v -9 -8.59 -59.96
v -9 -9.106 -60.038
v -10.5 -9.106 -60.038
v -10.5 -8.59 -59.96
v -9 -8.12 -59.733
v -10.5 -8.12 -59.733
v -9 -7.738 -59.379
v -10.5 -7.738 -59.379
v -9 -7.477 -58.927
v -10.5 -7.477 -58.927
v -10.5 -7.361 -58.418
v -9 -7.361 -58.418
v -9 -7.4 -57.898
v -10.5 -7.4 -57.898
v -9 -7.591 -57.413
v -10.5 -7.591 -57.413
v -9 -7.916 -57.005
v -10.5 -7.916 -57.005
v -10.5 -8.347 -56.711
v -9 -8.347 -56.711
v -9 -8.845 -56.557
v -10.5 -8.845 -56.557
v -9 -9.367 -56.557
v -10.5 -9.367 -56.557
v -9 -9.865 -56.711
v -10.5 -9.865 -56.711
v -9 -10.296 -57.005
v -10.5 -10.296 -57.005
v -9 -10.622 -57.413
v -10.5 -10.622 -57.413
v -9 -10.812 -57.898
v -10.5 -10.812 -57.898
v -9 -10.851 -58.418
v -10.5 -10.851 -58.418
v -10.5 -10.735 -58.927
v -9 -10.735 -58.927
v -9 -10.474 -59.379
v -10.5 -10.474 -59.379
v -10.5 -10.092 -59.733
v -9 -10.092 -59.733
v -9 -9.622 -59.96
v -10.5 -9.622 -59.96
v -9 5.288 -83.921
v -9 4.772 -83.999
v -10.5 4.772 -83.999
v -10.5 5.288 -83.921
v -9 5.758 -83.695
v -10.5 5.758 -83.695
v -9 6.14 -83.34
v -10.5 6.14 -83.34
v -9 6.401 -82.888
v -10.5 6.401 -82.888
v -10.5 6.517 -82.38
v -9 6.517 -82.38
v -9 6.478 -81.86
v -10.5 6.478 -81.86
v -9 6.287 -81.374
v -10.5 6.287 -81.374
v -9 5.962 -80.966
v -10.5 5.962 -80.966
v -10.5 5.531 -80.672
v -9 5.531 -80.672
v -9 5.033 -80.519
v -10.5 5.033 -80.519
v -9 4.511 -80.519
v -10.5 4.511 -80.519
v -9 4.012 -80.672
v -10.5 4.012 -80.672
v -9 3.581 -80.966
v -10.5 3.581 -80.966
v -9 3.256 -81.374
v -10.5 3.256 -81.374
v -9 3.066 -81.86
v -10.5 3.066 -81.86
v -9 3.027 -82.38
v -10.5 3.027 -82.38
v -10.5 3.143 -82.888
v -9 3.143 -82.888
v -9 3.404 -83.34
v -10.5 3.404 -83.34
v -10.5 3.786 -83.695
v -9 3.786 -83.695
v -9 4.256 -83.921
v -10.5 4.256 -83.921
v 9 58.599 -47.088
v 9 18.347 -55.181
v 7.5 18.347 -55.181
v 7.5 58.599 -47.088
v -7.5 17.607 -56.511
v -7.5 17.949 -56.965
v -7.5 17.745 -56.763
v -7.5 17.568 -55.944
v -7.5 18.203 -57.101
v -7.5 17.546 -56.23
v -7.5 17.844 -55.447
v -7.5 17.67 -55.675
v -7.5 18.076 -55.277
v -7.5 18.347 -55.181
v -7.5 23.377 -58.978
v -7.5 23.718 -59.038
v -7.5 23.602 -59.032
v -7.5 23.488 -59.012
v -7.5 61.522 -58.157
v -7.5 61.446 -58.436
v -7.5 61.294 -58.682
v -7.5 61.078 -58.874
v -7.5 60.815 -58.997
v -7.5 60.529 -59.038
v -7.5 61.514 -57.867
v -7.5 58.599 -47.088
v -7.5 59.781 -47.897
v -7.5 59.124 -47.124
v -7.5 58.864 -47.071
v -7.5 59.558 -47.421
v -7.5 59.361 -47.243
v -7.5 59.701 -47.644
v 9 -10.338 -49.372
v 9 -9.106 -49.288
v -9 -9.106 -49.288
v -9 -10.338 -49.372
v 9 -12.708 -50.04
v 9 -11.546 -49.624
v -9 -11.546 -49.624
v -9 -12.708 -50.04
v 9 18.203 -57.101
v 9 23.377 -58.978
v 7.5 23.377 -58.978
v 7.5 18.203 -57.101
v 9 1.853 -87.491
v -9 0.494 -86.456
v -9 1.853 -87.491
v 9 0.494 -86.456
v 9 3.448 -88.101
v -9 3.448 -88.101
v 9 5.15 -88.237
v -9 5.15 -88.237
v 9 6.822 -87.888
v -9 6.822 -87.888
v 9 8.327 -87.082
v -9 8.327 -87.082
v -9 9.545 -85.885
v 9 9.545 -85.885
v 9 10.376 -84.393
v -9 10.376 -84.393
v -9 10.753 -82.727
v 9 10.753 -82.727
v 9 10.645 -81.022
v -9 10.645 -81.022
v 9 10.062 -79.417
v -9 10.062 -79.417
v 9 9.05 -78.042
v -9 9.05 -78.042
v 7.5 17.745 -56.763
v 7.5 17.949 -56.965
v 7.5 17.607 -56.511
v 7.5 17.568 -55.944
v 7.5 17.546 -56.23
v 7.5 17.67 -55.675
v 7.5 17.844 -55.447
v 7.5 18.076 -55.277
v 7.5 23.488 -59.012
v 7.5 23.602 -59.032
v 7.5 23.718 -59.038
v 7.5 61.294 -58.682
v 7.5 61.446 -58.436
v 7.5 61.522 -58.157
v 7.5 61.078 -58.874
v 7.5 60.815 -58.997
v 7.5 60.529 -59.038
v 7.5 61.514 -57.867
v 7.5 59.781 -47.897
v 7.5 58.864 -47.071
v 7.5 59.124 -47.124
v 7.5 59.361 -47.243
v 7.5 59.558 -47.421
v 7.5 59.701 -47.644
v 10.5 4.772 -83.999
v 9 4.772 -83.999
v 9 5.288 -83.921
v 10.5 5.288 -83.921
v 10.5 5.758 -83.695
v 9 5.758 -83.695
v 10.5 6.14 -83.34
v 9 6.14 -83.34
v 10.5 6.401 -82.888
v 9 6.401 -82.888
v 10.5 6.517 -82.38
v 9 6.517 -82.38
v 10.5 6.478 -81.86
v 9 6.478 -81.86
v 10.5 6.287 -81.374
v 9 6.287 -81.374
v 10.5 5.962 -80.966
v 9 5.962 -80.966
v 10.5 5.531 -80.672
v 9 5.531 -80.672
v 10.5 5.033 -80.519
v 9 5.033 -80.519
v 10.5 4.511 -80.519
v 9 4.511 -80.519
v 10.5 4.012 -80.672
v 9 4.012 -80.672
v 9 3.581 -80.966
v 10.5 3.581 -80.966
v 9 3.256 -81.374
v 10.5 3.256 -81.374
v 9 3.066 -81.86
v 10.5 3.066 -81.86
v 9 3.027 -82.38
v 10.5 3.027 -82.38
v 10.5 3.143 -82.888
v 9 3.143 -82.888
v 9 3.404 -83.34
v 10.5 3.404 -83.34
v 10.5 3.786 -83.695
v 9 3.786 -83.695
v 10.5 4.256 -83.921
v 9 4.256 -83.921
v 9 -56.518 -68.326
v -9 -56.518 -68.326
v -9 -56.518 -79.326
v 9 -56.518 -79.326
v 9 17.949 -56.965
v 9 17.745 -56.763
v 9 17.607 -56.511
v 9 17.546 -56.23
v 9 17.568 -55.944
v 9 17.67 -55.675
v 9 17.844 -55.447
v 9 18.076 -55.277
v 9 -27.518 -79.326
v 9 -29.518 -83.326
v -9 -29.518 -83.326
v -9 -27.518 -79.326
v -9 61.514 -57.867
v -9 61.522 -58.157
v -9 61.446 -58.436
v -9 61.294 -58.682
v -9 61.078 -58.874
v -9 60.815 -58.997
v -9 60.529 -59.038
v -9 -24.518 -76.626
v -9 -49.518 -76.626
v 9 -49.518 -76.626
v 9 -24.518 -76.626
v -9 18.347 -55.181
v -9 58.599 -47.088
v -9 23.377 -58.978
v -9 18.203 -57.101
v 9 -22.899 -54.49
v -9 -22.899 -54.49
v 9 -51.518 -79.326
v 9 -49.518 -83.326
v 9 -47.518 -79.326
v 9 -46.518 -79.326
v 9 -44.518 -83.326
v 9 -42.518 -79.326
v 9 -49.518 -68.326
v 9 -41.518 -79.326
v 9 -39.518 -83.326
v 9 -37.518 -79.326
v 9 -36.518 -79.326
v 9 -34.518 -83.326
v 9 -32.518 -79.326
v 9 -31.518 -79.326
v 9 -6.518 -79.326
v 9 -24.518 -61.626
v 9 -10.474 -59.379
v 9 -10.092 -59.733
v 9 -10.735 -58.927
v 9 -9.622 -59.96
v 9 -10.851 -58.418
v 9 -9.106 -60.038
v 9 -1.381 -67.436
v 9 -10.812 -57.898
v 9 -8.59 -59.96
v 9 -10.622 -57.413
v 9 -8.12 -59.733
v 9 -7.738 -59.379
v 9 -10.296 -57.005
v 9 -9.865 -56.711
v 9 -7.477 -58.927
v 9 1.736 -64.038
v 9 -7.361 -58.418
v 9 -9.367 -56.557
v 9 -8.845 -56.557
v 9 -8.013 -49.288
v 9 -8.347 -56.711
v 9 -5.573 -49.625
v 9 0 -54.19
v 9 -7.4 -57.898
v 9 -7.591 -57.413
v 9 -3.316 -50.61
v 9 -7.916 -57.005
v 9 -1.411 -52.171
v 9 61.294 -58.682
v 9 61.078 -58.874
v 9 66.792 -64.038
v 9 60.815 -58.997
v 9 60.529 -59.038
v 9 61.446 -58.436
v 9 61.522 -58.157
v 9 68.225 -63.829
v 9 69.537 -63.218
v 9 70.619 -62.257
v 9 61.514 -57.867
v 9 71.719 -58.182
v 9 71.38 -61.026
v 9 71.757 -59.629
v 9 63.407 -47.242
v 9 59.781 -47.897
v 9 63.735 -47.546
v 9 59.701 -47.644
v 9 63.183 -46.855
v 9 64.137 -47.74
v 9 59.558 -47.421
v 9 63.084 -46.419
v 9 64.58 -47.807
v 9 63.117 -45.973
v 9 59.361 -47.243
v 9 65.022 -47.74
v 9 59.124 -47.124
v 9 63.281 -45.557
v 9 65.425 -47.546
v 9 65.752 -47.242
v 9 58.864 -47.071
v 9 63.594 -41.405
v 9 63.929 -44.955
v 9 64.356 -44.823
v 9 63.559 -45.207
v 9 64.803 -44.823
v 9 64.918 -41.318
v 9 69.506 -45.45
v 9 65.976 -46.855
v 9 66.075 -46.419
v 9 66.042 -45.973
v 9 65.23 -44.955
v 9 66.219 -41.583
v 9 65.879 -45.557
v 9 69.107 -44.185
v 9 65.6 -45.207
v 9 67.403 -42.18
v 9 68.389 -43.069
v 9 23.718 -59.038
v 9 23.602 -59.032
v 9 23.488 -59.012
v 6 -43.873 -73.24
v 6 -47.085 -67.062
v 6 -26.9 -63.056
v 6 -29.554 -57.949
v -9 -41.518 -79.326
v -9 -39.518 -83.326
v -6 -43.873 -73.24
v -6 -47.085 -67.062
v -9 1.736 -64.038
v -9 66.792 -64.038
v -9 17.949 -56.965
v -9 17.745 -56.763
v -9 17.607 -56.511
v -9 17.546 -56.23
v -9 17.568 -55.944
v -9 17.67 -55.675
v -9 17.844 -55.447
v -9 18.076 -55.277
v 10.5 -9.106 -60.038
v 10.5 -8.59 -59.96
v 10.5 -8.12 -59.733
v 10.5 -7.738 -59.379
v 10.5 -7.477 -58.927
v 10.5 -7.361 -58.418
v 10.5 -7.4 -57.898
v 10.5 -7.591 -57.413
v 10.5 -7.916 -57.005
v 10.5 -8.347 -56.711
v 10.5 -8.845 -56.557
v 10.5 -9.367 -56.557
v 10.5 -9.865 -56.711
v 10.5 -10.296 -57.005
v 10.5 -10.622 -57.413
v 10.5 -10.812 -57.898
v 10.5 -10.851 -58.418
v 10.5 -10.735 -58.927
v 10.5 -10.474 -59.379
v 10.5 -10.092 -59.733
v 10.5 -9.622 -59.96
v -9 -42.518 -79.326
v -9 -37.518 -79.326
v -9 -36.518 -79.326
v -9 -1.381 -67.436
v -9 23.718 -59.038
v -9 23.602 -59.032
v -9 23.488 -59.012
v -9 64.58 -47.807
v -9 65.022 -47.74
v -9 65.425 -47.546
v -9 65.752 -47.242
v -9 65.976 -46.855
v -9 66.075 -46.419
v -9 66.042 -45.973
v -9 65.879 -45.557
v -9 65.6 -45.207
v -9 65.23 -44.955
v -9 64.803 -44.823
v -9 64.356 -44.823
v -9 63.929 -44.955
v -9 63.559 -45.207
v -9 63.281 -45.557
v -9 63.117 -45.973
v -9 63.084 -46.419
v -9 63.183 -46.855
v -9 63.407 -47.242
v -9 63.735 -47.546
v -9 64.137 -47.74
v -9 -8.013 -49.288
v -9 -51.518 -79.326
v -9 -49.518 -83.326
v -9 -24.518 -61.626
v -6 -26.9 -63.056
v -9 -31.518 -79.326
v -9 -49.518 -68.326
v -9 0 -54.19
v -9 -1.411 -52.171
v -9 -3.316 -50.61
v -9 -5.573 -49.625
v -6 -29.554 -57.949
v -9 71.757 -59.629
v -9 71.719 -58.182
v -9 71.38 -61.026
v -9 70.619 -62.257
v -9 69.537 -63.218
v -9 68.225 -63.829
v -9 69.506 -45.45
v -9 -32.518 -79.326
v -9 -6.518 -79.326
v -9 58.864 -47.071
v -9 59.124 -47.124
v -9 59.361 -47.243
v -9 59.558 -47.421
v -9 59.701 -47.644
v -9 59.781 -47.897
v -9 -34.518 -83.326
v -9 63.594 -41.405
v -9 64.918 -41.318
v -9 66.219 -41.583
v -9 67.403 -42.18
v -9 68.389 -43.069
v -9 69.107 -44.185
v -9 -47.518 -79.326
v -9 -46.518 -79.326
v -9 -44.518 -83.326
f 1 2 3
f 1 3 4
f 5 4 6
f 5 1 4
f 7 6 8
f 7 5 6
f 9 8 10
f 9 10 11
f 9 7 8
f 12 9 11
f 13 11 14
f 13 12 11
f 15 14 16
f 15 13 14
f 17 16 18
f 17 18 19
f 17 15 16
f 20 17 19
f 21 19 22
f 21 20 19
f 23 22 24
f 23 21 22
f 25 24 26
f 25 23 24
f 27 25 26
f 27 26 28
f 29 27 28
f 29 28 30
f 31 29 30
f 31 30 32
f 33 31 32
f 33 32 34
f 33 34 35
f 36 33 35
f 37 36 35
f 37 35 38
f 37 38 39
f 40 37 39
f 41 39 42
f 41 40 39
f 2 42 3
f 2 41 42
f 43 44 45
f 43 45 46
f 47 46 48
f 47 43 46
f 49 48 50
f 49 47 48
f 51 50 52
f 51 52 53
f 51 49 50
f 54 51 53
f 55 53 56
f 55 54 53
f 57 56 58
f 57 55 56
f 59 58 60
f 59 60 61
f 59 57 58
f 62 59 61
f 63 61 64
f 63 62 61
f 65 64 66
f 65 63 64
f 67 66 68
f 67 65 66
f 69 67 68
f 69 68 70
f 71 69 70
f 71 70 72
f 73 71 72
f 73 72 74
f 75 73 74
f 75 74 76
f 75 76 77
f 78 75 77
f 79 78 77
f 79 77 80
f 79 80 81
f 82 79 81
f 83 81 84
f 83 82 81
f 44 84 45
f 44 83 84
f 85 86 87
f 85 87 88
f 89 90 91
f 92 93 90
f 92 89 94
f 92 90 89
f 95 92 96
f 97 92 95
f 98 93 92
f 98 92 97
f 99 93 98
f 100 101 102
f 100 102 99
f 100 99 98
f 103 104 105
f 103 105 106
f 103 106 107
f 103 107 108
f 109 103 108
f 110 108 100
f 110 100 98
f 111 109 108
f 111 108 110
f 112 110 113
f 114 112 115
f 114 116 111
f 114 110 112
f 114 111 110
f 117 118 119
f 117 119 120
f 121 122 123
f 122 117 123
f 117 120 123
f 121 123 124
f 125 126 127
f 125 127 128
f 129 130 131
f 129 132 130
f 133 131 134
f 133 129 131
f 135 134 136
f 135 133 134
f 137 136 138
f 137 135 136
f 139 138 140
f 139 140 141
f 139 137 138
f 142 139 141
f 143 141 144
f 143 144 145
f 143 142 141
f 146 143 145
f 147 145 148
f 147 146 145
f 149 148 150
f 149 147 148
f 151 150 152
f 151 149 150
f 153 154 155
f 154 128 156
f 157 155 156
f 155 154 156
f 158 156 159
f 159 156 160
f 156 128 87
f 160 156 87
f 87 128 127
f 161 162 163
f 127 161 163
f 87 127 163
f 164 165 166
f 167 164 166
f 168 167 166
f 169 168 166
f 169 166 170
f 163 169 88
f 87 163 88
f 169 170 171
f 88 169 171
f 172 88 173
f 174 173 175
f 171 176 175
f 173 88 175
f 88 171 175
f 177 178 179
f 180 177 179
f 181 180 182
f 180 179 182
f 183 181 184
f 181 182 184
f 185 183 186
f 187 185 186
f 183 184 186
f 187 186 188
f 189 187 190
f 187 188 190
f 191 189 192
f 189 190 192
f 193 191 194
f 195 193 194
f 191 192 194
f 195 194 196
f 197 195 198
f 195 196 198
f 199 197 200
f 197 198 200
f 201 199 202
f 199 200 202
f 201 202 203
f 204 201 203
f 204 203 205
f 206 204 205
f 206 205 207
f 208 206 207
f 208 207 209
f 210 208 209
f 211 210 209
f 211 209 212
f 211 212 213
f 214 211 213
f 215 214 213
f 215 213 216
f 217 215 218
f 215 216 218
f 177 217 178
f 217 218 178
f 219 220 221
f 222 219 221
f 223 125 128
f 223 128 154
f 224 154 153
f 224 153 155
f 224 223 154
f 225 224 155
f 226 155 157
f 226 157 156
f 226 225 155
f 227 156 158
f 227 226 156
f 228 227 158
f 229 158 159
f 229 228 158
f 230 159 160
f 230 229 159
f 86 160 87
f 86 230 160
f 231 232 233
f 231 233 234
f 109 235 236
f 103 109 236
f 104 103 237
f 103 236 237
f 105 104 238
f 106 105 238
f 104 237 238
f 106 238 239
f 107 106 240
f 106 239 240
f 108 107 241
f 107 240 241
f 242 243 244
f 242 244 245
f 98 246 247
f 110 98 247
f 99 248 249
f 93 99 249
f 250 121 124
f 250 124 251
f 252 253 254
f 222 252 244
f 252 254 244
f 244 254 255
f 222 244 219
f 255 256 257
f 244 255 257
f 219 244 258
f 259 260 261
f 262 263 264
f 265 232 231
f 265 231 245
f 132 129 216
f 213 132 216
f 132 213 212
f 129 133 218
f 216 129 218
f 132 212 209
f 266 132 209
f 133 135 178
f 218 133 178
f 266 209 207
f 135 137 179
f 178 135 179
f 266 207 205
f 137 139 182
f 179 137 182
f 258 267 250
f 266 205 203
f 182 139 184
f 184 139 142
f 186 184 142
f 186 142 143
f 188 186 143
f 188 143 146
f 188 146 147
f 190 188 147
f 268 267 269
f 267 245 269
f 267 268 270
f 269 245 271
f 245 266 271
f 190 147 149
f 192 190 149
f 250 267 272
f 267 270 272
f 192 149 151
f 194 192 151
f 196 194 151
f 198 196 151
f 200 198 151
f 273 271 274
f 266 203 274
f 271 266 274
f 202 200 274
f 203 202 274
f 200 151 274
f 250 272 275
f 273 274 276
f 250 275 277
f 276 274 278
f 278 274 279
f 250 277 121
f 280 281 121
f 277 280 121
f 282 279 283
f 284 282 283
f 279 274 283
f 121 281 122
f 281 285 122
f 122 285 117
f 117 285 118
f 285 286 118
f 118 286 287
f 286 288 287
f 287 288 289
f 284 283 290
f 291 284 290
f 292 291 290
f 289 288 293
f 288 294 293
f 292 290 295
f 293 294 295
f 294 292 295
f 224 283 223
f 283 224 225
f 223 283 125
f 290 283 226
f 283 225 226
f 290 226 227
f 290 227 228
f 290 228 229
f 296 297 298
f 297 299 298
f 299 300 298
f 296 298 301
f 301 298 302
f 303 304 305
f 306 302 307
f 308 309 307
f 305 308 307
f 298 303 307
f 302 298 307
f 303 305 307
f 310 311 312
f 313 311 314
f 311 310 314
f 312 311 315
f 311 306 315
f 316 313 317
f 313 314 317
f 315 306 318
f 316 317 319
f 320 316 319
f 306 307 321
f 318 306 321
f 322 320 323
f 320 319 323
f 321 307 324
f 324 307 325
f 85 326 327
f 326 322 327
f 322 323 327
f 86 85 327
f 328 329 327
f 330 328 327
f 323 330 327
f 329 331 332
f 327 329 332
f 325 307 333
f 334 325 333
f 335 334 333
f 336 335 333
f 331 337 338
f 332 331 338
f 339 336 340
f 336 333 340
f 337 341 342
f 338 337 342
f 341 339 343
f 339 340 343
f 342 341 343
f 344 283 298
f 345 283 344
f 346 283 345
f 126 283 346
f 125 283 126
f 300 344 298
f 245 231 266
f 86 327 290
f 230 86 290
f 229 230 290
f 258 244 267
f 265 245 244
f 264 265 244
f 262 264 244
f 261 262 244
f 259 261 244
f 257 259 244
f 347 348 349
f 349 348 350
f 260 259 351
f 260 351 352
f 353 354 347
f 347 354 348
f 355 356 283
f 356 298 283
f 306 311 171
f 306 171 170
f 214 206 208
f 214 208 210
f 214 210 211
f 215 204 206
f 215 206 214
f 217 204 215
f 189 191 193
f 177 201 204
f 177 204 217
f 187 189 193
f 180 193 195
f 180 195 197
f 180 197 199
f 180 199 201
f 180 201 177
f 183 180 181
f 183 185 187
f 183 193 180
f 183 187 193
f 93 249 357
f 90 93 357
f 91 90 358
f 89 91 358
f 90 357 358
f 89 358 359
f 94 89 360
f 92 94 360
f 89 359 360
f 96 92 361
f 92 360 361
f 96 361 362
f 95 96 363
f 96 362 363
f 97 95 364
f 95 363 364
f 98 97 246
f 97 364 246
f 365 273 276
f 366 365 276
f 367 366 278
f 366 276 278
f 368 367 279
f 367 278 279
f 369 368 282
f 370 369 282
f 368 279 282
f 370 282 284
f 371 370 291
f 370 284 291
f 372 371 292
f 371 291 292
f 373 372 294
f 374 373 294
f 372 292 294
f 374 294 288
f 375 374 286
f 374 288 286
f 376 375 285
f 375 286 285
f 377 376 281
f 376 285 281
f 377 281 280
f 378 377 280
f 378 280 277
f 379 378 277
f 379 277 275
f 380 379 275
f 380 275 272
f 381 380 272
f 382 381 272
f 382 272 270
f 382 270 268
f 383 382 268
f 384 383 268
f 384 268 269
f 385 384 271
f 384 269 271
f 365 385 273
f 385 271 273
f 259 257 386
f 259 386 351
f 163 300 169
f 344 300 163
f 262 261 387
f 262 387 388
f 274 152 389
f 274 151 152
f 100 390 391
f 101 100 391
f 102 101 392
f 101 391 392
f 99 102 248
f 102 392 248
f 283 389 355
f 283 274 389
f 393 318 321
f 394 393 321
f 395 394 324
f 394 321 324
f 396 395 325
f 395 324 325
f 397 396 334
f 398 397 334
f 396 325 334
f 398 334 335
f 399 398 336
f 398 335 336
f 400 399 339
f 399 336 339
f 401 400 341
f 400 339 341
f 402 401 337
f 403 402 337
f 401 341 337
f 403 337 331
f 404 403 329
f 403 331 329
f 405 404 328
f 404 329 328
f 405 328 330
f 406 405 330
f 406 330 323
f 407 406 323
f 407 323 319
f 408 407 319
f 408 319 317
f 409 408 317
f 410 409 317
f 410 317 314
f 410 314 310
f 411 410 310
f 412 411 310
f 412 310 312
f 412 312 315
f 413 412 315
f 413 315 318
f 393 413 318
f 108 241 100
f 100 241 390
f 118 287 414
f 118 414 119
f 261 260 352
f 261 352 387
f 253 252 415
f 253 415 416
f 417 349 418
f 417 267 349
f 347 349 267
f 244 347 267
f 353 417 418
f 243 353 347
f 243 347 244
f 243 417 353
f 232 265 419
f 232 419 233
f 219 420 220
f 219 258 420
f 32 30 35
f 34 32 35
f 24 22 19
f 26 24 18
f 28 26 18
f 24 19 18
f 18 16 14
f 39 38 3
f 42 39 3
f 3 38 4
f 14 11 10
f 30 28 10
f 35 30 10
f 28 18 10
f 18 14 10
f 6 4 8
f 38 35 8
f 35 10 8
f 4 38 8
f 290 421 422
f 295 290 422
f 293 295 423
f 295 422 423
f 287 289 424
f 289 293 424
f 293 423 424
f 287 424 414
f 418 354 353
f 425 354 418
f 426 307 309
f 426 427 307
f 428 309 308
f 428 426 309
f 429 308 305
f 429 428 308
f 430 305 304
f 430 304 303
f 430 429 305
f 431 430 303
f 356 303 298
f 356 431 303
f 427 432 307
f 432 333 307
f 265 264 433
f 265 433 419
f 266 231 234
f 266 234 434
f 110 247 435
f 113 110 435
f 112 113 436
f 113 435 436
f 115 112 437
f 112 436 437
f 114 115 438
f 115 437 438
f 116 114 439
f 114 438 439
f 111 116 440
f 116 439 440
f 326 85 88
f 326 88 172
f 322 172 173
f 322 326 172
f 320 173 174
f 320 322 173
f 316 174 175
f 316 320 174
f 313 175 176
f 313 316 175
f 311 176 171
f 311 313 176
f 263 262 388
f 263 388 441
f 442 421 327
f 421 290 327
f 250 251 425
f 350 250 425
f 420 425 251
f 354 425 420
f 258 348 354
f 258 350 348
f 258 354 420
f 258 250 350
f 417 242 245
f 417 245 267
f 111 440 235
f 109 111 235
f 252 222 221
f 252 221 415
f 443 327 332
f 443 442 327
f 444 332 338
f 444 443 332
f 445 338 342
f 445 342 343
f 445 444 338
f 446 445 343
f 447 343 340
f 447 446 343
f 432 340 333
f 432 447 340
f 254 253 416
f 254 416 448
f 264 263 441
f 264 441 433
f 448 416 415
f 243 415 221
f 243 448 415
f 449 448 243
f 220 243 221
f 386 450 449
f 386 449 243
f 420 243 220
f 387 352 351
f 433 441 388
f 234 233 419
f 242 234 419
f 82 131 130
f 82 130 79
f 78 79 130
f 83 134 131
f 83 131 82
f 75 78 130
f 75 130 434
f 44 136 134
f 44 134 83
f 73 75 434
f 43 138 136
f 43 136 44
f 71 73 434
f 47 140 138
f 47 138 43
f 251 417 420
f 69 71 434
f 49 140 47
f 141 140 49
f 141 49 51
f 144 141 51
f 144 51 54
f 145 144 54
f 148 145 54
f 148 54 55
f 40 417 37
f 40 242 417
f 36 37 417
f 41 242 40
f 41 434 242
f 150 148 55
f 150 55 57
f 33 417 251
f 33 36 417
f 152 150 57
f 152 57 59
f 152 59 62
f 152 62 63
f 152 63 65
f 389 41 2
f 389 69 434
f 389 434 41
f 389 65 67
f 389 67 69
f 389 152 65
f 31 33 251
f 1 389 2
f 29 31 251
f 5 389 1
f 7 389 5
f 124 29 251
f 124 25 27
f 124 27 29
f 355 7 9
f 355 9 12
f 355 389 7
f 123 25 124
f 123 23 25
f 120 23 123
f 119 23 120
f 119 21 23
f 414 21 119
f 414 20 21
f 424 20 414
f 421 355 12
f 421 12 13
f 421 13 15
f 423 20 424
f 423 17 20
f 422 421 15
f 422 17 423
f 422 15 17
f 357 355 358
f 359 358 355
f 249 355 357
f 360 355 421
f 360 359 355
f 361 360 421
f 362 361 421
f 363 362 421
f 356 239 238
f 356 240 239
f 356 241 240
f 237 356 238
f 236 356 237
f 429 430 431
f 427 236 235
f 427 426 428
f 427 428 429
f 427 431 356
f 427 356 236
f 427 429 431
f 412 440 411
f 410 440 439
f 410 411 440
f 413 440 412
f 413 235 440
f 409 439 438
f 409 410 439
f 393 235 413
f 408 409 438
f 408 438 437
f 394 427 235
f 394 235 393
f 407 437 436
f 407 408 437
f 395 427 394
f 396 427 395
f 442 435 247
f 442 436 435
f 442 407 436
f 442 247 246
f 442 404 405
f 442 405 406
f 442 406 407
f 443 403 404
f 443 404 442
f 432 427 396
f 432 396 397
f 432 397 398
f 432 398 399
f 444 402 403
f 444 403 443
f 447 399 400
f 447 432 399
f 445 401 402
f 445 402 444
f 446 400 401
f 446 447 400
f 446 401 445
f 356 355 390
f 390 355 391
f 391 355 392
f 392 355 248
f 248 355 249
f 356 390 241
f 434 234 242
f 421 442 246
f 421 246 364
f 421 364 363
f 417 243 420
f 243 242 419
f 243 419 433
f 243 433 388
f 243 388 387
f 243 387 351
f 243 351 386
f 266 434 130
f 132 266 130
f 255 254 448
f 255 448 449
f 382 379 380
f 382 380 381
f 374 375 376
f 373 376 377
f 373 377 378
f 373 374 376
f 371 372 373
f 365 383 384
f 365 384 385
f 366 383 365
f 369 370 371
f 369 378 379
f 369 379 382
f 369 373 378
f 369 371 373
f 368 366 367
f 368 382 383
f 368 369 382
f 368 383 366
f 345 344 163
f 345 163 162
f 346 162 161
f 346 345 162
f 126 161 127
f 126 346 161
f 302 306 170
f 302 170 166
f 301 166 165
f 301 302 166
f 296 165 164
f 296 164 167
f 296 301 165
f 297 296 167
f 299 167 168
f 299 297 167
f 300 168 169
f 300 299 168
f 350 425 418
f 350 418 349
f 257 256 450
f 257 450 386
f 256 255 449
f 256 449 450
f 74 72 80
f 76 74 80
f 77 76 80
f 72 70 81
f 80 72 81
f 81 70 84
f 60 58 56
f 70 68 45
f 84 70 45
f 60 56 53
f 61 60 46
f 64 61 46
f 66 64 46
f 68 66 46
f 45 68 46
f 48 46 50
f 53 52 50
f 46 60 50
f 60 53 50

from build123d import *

# Parameters (mm, degrees)
BOSS_EXTRUDE1_DEPTH     = 9
CUT_EXTRUDE1_DEPTH      = 116.769079262
CUT_EXTRUDE1_DEPTH_BACK = 116.769079262
BOSS_EXTRUDE2_DEPTH     = 18
LPATTERN1_COUNT         = 5
LPATTERN1_PITCH         = 5
FILLET1_R               = 9
FILLET2_R               = 5
SKETCH5_R               = 1.5
CUT_EXTRUDE2_DEPTH      = 25
CUT_EXTRUDE3_REACH      = 94.43
SKETCH8_W               = 12
SKETCH8_H               = 19.757506074
SKETCH9_R               = 1.75
BOSS_EXTRUDE3_DEPTH     = 1.5
SKETCH10_R              = 1.75
BOSS_EXTRUDE4_DEPTH     = 1.5
CUT_EXTRUDE5_DEPTH      = 1.5


with BuildPart() as part:
    # Sketch1 → Boss-Extrude1 (new, symmetric)
    with BuildSketch(Plane(origin=(0, 0, 0), x_dir=(0, 0, -1), z_dir=(1, 0, 0))):
        Polygon((64.03845405, 1.736481777), (54.19037652, 0), (40.392944784, 68.626750451), (64.03845405, 72.736481777), align=None)
        with BuildLine():
            Line((79.326468903, -6.518014035), (86.456160579, 0.493939802))
            ThreePointArc((86.456160579, 0.493939802), (86.526803283, 8.978927109), (78.041815975, 9.049569813))
            Line((78.041815975, 9.049569813), (67.436419126, -1.380692322))
            Line((67.436419126, -1.380692322), (64.03845405, 1.736481777))
            Line((64.03845405, 1.736481777), (54.19037652, 0))
            Line((54.19037652, 0), (49.287534486, -0.985718074))
            Line((49.287534486, -0.985718074), (49.287534486, -10.985718074))
            Line((49.287534486, -10.985718074), (54.49039716, -22.899165098))
            Line((54.49039716, -22.899165098), (68.326468903, -49.518014035))
            Line((68.326468903, -49.518014035), (68.326468903, -56.518014035))
            Line((68.326468903, -56.518014035), (79.326468903, -56.518014035))
            Line((79.326468903, -56.518014035), (79.326468903, -6.518014035))
        make_face()
    extrude(amount=BOSS_EXTRUDE1_DEPTH, both=True)

    # Sketch3 → Cut-Extrude1 (cut, two sides: drawn at the far end of the back side and taken through both)
    with BuildSketch(Plane(origin=(9, 0, 0), x_dir=(0, 0, -1), z_dir=(1, 0, 0)).offset(-CUT_EXTRUDE1_DEPTH_BACK)):
        Polygon((76.626468903, -49.518014035), (76.626468903, -24.518014035), (61.626468903, -24.518014035), align=None)
    extrude(amount=CUT_EXTRUDE1_DEPTH + CUT_EXTRUDE1_DEPTH_BACK, mode=Mode.SUBTRACT)

    # Sketch4 → Boss-Extrude2 (add)
    with BuildSketch(Plane(origin=(9, 0, 0), x_dir=(0, 0, -1), z_dir=(1, 0, 0))):
        Polygon((83.326468903, -49.518014035), (79.326468903, -49.518014035), (79.326468903, -51.518014035), align=None)
        Polygon((79.326468903, -47.518014035), (79.326468903, -49.518014035), (83.326468903, -49.518014035), align=None)
    boss_extrude2 = extrude(amount=-BOSS_EXTRUDE2_DEPTH)

    # LPattern1: Boss-Extrude2 ×5
    with Locations(*[(0, i * LPATTERN1_PITCH, 0) for i in range(1, LPATTERN1_COUNT)]):
        add(boss_extrude2)

    # Fillet1
    # the kernel refuses this fillet: 9 mm, written as the material it takes off along each edge
    with BuildSketch(Plane(origin=(-13.698844365, -10.985718074, -49.287534486), x_dir=(0, -0.9164190018423571, -0.4002202057146263), z_dir=(1, 0, 0))) as fillet1_piece_1:
        with BuildLine():
            CenterArc((FILLET1_R * 0.208837527352, FILLET1_R), FILLET1_R, 246.408054679, 23.591945321)
            Line((-FILLET1_R * 0.191382678363, FILLET1_R * 0.0835809981576), (-FILLET1_R * 0.199387082477, FILLET1_R * 0.0652526181208))
            Line((-FILLET1_R * 0.199387082477, FILLET1_R * 0.0652526181208), (-FILLET1_R * 0.00417675054703, -FILLET1_R * 0.02))
            Line((-FILLET1_R * 0.00417675054703, -FILLET1_R * 0.02), (FILLET1_R * 0.208837527352, -FILLET1_R * 0.02))
            Line((FILLET1_R * 0.208837527352, -FILLET1_R * 0.02), (FILLET1_R * 0.208837527352, 0))
        make_face()
    extrude(amount=27.397688731, mode=Mode.SUBTRACT)
    with BuildSketch(Plane(origin=(-26.569004687, -0.985718074, -49.287534486), x_dir=(0, -1, 0), z_dir=(1, 0, 0))) as fillet1_piece_2:
        with BuildLine():
            CenterArc((7.027601875, 9), FILLET1_R, 207.080362773, 62.919637227)
            Line((-0.985718074, 4.902842034), (-1.145984473, 4.820898874))
            ThreePointArc((-1.145984473, 4.820898874), (-0.669327824, 2.415941907), (-0.176468787, -0.03547911))
            Line((-0.176468787, -0.03547911), (0, -0.18))
            Line((0, -0.18), (7.027601875, -0.18))
            Line((7.027601875, -0.18), (7.027601875, 0))
        make_face()
    extrude(amount=53.138009374, mode=Mode.SUBTRACT)

    # Fillet2
    fillet2_edges = [part.edges().sort_by_distance(p)[0] for p in [
        (0, 68.626750451, -40.392944784),
        (0, 72.736481777, -64.03845405),
    ]]
    fillet(fillet2_edges, radius=FILLET2_R)

    # Sketch5 → Cut-Extrude2 (cut)
    with BuildSketch(Plane(origin=(9, 0, 0), x_dir=(0, 0, -1), z_dir=(1, 0, 0))):
        with Locations((46.306671362, 64.579632178)):
            Circle(SKETCH5_R)
    extrude(amount=-CUT_EXTRUDE2_DEPTH, mode=Mode.SUBTRACT)

    # Cut-Extrude3: up to this plane
    cut_extrude3_end = Plane(origin=(-9, -24.518014035, -61.626468903), z_dir=(0, -0.5144957554275262, 0.8574929257125444))
    # Sketch8 → Cut-Extrude3 (cut, up to the surface)
    with BuildSketch(Plane(origin=(0, 17.427872297, -33.529018106), x_dir=(1, 0, 0), z_dir=(0, -0.4612023914177088, 0.8872949645696107)), mode=Mode.PRIVATE) as cut_extrude3_sk1:
        with Locations((0, -62.828168401)):
            Rectangle(SKETCH8_W, SKETCH8_H)
    cut_extrude3_tool1 = split(extrude(cut_extrude3_sk1.sketch, amount=-CUT_EXTRUDE3_REACH, mode=Mode.PRIVATE), bisect_by=cut_extrude3_end, keep=Keep.BOTH, mode=Mode.PRIVATE)
    add(cut_extrude3_tool1.solids().sort_by_distance((0, -38.319245, -62.50552))[0], mode=Mode.SUBTRACT)

    # Sketch9 → Boss-Extrude3 (add)
    with BuildSketch(Plane(origin=(9, 0, 0), x_dir=(0, 0, -1), z_dir=(1, 0, 0))):
        with Locations((82.248988277, 4.771754807)):
            Circle(SKETCH9_R)
    boss_extrude3 = extrude(amount=BOSS_EXTRUDE3_DEPTH)

    # Sketch10 → Boss-Extrude4 (add)
    with BuildSketch(Plane(origin=(9, 0, 0), x_dir=(0, 0, -1), z_dir=(1, 0, 0))):
        with Locations((58.287534486, -9.106180328)):
            Circle(SKETCH10_R)
    boss_extrude4 = extrude(amount=BOSS_EXTRUDE4_DEPTH)

    # Sketch11 → Cut-Extrude5 (cut)
    with BuildSketch(Plane(origin=(9, 0, 0), x_dir=(0, 0, -1), z_dir=(1, 0, 0))):
        with BuildLine():
            Line((59.03845405, 60.528735066), (59.03845405, 23.717958421))
            ThreePointArc((59.03845405, 23.717958421), (59.023347404, 23.544796412), (58.978483887, 23.376866197))
            Line((58.978483887, 23.376866197), (57.101026027, 18.202704248))
            ThreePointArc((57.101026027, 18.202704248), (56.086229397, 17.546595426), (55.180614041, 18.346690305))
            Line((55.180614041, 18.346690305), (47.087922198, 58.598757084))
            ThreePointArc((47.087922198, 58.598757084), (47.2430546, 59.360631218), (47.897065542, 59.781092804))
            Line((47.897065542, 59.781092804), (57.867215244, 61.513964619))
            ThreePointArc((57.867215244, 61.513964619), (58.682178057, 61.293992802), (59.03845405, 60.528735066))
        make_face()
    cut_extrude5 = extrude(amount=-CUT_EXTRUDE5_DEPTH, mode=Mode.SUBTRACT)

    # Mirror1: Cut-Extrude5 across plane
    add(cut_extrude5.mirror(Plane(origin=(0, 0, 0), x_dir=(0, 0, 1), z_dir=(1, 0, 0))), mode=Mode.SUBTRACT)

    # Mirror2: Boss-Extrude3, Boss-Extrude4 across plane
    add(boss_extrude3.mirror(Plane(origin=(0, 0, 0), x_dir=(0, 0, 1), z_dir=(1, 0, 0))))
    add(boss_extrude4.mirror(Plane(origin=(0, 0, 0), x_dir=(0, 0, 1), z_dir=(1, 0, 0))))


solid = part.part
